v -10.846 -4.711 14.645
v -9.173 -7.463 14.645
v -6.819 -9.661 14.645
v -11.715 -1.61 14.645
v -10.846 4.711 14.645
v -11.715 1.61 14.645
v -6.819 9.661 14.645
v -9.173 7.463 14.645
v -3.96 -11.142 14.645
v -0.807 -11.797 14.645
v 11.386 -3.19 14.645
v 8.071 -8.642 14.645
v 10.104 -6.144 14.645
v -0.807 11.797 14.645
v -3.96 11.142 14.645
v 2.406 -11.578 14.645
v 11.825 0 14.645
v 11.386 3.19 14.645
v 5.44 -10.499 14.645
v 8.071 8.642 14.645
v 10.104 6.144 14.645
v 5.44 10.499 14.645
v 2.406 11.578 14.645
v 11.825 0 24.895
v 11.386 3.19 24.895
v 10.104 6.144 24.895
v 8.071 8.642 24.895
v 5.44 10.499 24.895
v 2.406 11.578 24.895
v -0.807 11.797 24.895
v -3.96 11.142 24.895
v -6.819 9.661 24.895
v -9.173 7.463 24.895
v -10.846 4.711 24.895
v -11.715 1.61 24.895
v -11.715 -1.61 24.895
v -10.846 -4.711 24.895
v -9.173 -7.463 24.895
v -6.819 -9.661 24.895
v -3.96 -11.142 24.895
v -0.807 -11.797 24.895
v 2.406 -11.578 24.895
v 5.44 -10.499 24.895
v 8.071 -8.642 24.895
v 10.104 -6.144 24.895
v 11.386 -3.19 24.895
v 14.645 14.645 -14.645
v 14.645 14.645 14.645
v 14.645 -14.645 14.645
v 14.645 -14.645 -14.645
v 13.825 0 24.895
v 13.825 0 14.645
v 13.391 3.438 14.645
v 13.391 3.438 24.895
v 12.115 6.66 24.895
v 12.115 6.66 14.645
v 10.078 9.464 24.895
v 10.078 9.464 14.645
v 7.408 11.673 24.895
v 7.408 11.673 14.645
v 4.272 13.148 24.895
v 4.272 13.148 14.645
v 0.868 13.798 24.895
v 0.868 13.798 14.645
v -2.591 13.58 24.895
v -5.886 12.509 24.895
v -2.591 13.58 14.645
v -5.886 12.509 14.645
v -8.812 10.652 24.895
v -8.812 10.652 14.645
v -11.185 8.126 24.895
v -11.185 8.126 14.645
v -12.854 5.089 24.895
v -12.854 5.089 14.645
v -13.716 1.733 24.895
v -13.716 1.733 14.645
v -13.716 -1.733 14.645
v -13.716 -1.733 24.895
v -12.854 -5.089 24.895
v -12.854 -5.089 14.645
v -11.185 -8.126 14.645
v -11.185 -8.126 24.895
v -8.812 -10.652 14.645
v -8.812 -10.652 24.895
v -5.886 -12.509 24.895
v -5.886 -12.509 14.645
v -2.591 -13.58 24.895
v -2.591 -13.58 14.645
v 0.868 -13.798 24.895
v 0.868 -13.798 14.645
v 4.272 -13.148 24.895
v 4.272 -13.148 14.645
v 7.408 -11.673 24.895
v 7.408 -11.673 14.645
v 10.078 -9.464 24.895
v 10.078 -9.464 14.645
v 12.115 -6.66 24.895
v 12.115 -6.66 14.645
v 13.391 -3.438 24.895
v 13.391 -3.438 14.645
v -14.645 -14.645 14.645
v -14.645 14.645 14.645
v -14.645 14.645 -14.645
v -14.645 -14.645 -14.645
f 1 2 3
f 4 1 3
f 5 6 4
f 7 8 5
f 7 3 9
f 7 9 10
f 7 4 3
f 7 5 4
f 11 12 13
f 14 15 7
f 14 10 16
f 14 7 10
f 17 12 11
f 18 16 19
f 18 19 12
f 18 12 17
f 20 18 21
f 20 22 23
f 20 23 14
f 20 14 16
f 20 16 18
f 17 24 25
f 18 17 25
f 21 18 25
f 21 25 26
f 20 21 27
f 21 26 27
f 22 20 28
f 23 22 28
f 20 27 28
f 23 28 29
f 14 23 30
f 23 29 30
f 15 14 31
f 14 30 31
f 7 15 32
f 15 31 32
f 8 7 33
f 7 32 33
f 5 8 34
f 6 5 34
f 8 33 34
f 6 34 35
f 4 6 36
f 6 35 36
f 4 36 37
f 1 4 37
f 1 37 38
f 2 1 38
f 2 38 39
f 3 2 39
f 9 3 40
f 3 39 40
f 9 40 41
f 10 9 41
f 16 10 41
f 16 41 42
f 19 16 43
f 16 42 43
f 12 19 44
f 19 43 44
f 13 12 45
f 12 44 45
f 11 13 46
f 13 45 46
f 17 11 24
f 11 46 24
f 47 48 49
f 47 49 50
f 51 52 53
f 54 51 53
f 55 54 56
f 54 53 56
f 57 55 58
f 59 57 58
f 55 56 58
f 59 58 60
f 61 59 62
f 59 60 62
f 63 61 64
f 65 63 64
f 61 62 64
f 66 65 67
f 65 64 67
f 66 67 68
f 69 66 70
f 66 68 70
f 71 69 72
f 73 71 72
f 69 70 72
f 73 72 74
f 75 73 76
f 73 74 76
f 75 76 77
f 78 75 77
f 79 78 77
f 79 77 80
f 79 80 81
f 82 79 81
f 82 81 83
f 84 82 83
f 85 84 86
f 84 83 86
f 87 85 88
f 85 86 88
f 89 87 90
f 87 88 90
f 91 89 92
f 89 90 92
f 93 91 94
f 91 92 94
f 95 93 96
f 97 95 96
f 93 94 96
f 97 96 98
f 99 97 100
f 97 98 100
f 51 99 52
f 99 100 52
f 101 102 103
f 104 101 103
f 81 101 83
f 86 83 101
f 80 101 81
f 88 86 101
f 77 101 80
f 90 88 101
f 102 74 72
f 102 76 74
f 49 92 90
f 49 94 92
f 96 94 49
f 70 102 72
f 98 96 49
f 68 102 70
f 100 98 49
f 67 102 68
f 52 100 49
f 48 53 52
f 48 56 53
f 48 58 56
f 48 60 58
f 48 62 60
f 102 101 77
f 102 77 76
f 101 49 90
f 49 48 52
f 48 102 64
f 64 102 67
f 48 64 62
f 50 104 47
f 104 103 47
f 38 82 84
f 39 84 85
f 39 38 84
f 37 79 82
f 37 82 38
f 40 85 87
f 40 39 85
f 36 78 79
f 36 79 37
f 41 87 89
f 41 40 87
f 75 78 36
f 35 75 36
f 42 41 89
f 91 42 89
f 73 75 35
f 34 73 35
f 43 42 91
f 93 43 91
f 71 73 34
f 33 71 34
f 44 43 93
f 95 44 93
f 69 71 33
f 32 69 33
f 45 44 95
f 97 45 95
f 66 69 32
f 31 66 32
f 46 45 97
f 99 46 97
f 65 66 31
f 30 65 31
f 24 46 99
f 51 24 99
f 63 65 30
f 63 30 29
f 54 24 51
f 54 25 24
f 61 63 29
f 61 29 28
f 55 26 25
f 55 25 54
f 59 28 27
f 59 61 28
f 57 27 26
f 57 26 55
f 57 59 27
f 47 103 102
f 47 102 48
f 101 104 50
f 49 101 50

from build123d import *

# Parameters (mm, degrees)
SKETCH2_W           = 29.29
SKETCH2_H           = 29.29
BOSS_EXTRUDE1_DEPTH = 14.645
SKETCH3_R           = 13.825
BOSS_EXTRUDE2_DEPTH = 10.25
SKETCH4_R           = 11.825
CUT_EXTRUDE1_DEPTH  = 10.25


with BuildPart() as part:
    # Sketch2 → Boss-Extrude1 (new body, symmetric)
    with BuildSketch(Plane(origin=(0, 0, 0), x_dir=(1, 0, 0), z_dir=(0, 1, 0))):
        Rectangle(SKETCH2_W, SKETCH2_H)
    extrude(amount=BOSS_EXTRUDE1_DEPTH, both=True)

    # Sketch3 → Boss-Extrude2 (add)
    with BuildSketch(Plane.XY.offset(14.645)):
        Circle(SKETCH3_R)
    extrude(amount=BOSS_EXTRUDE2_DEPTH)

    # Sketch4 → Cut-Extrude1 (cut)
    with BuildSketch(Plane.XY.offset(24.895)):
        Circle(SKETCH4_R)
    extrude(amount=-CUT_EXTRUDE1_DEPTH, mode=Mode.SUBTRACT)


solid = part.part
